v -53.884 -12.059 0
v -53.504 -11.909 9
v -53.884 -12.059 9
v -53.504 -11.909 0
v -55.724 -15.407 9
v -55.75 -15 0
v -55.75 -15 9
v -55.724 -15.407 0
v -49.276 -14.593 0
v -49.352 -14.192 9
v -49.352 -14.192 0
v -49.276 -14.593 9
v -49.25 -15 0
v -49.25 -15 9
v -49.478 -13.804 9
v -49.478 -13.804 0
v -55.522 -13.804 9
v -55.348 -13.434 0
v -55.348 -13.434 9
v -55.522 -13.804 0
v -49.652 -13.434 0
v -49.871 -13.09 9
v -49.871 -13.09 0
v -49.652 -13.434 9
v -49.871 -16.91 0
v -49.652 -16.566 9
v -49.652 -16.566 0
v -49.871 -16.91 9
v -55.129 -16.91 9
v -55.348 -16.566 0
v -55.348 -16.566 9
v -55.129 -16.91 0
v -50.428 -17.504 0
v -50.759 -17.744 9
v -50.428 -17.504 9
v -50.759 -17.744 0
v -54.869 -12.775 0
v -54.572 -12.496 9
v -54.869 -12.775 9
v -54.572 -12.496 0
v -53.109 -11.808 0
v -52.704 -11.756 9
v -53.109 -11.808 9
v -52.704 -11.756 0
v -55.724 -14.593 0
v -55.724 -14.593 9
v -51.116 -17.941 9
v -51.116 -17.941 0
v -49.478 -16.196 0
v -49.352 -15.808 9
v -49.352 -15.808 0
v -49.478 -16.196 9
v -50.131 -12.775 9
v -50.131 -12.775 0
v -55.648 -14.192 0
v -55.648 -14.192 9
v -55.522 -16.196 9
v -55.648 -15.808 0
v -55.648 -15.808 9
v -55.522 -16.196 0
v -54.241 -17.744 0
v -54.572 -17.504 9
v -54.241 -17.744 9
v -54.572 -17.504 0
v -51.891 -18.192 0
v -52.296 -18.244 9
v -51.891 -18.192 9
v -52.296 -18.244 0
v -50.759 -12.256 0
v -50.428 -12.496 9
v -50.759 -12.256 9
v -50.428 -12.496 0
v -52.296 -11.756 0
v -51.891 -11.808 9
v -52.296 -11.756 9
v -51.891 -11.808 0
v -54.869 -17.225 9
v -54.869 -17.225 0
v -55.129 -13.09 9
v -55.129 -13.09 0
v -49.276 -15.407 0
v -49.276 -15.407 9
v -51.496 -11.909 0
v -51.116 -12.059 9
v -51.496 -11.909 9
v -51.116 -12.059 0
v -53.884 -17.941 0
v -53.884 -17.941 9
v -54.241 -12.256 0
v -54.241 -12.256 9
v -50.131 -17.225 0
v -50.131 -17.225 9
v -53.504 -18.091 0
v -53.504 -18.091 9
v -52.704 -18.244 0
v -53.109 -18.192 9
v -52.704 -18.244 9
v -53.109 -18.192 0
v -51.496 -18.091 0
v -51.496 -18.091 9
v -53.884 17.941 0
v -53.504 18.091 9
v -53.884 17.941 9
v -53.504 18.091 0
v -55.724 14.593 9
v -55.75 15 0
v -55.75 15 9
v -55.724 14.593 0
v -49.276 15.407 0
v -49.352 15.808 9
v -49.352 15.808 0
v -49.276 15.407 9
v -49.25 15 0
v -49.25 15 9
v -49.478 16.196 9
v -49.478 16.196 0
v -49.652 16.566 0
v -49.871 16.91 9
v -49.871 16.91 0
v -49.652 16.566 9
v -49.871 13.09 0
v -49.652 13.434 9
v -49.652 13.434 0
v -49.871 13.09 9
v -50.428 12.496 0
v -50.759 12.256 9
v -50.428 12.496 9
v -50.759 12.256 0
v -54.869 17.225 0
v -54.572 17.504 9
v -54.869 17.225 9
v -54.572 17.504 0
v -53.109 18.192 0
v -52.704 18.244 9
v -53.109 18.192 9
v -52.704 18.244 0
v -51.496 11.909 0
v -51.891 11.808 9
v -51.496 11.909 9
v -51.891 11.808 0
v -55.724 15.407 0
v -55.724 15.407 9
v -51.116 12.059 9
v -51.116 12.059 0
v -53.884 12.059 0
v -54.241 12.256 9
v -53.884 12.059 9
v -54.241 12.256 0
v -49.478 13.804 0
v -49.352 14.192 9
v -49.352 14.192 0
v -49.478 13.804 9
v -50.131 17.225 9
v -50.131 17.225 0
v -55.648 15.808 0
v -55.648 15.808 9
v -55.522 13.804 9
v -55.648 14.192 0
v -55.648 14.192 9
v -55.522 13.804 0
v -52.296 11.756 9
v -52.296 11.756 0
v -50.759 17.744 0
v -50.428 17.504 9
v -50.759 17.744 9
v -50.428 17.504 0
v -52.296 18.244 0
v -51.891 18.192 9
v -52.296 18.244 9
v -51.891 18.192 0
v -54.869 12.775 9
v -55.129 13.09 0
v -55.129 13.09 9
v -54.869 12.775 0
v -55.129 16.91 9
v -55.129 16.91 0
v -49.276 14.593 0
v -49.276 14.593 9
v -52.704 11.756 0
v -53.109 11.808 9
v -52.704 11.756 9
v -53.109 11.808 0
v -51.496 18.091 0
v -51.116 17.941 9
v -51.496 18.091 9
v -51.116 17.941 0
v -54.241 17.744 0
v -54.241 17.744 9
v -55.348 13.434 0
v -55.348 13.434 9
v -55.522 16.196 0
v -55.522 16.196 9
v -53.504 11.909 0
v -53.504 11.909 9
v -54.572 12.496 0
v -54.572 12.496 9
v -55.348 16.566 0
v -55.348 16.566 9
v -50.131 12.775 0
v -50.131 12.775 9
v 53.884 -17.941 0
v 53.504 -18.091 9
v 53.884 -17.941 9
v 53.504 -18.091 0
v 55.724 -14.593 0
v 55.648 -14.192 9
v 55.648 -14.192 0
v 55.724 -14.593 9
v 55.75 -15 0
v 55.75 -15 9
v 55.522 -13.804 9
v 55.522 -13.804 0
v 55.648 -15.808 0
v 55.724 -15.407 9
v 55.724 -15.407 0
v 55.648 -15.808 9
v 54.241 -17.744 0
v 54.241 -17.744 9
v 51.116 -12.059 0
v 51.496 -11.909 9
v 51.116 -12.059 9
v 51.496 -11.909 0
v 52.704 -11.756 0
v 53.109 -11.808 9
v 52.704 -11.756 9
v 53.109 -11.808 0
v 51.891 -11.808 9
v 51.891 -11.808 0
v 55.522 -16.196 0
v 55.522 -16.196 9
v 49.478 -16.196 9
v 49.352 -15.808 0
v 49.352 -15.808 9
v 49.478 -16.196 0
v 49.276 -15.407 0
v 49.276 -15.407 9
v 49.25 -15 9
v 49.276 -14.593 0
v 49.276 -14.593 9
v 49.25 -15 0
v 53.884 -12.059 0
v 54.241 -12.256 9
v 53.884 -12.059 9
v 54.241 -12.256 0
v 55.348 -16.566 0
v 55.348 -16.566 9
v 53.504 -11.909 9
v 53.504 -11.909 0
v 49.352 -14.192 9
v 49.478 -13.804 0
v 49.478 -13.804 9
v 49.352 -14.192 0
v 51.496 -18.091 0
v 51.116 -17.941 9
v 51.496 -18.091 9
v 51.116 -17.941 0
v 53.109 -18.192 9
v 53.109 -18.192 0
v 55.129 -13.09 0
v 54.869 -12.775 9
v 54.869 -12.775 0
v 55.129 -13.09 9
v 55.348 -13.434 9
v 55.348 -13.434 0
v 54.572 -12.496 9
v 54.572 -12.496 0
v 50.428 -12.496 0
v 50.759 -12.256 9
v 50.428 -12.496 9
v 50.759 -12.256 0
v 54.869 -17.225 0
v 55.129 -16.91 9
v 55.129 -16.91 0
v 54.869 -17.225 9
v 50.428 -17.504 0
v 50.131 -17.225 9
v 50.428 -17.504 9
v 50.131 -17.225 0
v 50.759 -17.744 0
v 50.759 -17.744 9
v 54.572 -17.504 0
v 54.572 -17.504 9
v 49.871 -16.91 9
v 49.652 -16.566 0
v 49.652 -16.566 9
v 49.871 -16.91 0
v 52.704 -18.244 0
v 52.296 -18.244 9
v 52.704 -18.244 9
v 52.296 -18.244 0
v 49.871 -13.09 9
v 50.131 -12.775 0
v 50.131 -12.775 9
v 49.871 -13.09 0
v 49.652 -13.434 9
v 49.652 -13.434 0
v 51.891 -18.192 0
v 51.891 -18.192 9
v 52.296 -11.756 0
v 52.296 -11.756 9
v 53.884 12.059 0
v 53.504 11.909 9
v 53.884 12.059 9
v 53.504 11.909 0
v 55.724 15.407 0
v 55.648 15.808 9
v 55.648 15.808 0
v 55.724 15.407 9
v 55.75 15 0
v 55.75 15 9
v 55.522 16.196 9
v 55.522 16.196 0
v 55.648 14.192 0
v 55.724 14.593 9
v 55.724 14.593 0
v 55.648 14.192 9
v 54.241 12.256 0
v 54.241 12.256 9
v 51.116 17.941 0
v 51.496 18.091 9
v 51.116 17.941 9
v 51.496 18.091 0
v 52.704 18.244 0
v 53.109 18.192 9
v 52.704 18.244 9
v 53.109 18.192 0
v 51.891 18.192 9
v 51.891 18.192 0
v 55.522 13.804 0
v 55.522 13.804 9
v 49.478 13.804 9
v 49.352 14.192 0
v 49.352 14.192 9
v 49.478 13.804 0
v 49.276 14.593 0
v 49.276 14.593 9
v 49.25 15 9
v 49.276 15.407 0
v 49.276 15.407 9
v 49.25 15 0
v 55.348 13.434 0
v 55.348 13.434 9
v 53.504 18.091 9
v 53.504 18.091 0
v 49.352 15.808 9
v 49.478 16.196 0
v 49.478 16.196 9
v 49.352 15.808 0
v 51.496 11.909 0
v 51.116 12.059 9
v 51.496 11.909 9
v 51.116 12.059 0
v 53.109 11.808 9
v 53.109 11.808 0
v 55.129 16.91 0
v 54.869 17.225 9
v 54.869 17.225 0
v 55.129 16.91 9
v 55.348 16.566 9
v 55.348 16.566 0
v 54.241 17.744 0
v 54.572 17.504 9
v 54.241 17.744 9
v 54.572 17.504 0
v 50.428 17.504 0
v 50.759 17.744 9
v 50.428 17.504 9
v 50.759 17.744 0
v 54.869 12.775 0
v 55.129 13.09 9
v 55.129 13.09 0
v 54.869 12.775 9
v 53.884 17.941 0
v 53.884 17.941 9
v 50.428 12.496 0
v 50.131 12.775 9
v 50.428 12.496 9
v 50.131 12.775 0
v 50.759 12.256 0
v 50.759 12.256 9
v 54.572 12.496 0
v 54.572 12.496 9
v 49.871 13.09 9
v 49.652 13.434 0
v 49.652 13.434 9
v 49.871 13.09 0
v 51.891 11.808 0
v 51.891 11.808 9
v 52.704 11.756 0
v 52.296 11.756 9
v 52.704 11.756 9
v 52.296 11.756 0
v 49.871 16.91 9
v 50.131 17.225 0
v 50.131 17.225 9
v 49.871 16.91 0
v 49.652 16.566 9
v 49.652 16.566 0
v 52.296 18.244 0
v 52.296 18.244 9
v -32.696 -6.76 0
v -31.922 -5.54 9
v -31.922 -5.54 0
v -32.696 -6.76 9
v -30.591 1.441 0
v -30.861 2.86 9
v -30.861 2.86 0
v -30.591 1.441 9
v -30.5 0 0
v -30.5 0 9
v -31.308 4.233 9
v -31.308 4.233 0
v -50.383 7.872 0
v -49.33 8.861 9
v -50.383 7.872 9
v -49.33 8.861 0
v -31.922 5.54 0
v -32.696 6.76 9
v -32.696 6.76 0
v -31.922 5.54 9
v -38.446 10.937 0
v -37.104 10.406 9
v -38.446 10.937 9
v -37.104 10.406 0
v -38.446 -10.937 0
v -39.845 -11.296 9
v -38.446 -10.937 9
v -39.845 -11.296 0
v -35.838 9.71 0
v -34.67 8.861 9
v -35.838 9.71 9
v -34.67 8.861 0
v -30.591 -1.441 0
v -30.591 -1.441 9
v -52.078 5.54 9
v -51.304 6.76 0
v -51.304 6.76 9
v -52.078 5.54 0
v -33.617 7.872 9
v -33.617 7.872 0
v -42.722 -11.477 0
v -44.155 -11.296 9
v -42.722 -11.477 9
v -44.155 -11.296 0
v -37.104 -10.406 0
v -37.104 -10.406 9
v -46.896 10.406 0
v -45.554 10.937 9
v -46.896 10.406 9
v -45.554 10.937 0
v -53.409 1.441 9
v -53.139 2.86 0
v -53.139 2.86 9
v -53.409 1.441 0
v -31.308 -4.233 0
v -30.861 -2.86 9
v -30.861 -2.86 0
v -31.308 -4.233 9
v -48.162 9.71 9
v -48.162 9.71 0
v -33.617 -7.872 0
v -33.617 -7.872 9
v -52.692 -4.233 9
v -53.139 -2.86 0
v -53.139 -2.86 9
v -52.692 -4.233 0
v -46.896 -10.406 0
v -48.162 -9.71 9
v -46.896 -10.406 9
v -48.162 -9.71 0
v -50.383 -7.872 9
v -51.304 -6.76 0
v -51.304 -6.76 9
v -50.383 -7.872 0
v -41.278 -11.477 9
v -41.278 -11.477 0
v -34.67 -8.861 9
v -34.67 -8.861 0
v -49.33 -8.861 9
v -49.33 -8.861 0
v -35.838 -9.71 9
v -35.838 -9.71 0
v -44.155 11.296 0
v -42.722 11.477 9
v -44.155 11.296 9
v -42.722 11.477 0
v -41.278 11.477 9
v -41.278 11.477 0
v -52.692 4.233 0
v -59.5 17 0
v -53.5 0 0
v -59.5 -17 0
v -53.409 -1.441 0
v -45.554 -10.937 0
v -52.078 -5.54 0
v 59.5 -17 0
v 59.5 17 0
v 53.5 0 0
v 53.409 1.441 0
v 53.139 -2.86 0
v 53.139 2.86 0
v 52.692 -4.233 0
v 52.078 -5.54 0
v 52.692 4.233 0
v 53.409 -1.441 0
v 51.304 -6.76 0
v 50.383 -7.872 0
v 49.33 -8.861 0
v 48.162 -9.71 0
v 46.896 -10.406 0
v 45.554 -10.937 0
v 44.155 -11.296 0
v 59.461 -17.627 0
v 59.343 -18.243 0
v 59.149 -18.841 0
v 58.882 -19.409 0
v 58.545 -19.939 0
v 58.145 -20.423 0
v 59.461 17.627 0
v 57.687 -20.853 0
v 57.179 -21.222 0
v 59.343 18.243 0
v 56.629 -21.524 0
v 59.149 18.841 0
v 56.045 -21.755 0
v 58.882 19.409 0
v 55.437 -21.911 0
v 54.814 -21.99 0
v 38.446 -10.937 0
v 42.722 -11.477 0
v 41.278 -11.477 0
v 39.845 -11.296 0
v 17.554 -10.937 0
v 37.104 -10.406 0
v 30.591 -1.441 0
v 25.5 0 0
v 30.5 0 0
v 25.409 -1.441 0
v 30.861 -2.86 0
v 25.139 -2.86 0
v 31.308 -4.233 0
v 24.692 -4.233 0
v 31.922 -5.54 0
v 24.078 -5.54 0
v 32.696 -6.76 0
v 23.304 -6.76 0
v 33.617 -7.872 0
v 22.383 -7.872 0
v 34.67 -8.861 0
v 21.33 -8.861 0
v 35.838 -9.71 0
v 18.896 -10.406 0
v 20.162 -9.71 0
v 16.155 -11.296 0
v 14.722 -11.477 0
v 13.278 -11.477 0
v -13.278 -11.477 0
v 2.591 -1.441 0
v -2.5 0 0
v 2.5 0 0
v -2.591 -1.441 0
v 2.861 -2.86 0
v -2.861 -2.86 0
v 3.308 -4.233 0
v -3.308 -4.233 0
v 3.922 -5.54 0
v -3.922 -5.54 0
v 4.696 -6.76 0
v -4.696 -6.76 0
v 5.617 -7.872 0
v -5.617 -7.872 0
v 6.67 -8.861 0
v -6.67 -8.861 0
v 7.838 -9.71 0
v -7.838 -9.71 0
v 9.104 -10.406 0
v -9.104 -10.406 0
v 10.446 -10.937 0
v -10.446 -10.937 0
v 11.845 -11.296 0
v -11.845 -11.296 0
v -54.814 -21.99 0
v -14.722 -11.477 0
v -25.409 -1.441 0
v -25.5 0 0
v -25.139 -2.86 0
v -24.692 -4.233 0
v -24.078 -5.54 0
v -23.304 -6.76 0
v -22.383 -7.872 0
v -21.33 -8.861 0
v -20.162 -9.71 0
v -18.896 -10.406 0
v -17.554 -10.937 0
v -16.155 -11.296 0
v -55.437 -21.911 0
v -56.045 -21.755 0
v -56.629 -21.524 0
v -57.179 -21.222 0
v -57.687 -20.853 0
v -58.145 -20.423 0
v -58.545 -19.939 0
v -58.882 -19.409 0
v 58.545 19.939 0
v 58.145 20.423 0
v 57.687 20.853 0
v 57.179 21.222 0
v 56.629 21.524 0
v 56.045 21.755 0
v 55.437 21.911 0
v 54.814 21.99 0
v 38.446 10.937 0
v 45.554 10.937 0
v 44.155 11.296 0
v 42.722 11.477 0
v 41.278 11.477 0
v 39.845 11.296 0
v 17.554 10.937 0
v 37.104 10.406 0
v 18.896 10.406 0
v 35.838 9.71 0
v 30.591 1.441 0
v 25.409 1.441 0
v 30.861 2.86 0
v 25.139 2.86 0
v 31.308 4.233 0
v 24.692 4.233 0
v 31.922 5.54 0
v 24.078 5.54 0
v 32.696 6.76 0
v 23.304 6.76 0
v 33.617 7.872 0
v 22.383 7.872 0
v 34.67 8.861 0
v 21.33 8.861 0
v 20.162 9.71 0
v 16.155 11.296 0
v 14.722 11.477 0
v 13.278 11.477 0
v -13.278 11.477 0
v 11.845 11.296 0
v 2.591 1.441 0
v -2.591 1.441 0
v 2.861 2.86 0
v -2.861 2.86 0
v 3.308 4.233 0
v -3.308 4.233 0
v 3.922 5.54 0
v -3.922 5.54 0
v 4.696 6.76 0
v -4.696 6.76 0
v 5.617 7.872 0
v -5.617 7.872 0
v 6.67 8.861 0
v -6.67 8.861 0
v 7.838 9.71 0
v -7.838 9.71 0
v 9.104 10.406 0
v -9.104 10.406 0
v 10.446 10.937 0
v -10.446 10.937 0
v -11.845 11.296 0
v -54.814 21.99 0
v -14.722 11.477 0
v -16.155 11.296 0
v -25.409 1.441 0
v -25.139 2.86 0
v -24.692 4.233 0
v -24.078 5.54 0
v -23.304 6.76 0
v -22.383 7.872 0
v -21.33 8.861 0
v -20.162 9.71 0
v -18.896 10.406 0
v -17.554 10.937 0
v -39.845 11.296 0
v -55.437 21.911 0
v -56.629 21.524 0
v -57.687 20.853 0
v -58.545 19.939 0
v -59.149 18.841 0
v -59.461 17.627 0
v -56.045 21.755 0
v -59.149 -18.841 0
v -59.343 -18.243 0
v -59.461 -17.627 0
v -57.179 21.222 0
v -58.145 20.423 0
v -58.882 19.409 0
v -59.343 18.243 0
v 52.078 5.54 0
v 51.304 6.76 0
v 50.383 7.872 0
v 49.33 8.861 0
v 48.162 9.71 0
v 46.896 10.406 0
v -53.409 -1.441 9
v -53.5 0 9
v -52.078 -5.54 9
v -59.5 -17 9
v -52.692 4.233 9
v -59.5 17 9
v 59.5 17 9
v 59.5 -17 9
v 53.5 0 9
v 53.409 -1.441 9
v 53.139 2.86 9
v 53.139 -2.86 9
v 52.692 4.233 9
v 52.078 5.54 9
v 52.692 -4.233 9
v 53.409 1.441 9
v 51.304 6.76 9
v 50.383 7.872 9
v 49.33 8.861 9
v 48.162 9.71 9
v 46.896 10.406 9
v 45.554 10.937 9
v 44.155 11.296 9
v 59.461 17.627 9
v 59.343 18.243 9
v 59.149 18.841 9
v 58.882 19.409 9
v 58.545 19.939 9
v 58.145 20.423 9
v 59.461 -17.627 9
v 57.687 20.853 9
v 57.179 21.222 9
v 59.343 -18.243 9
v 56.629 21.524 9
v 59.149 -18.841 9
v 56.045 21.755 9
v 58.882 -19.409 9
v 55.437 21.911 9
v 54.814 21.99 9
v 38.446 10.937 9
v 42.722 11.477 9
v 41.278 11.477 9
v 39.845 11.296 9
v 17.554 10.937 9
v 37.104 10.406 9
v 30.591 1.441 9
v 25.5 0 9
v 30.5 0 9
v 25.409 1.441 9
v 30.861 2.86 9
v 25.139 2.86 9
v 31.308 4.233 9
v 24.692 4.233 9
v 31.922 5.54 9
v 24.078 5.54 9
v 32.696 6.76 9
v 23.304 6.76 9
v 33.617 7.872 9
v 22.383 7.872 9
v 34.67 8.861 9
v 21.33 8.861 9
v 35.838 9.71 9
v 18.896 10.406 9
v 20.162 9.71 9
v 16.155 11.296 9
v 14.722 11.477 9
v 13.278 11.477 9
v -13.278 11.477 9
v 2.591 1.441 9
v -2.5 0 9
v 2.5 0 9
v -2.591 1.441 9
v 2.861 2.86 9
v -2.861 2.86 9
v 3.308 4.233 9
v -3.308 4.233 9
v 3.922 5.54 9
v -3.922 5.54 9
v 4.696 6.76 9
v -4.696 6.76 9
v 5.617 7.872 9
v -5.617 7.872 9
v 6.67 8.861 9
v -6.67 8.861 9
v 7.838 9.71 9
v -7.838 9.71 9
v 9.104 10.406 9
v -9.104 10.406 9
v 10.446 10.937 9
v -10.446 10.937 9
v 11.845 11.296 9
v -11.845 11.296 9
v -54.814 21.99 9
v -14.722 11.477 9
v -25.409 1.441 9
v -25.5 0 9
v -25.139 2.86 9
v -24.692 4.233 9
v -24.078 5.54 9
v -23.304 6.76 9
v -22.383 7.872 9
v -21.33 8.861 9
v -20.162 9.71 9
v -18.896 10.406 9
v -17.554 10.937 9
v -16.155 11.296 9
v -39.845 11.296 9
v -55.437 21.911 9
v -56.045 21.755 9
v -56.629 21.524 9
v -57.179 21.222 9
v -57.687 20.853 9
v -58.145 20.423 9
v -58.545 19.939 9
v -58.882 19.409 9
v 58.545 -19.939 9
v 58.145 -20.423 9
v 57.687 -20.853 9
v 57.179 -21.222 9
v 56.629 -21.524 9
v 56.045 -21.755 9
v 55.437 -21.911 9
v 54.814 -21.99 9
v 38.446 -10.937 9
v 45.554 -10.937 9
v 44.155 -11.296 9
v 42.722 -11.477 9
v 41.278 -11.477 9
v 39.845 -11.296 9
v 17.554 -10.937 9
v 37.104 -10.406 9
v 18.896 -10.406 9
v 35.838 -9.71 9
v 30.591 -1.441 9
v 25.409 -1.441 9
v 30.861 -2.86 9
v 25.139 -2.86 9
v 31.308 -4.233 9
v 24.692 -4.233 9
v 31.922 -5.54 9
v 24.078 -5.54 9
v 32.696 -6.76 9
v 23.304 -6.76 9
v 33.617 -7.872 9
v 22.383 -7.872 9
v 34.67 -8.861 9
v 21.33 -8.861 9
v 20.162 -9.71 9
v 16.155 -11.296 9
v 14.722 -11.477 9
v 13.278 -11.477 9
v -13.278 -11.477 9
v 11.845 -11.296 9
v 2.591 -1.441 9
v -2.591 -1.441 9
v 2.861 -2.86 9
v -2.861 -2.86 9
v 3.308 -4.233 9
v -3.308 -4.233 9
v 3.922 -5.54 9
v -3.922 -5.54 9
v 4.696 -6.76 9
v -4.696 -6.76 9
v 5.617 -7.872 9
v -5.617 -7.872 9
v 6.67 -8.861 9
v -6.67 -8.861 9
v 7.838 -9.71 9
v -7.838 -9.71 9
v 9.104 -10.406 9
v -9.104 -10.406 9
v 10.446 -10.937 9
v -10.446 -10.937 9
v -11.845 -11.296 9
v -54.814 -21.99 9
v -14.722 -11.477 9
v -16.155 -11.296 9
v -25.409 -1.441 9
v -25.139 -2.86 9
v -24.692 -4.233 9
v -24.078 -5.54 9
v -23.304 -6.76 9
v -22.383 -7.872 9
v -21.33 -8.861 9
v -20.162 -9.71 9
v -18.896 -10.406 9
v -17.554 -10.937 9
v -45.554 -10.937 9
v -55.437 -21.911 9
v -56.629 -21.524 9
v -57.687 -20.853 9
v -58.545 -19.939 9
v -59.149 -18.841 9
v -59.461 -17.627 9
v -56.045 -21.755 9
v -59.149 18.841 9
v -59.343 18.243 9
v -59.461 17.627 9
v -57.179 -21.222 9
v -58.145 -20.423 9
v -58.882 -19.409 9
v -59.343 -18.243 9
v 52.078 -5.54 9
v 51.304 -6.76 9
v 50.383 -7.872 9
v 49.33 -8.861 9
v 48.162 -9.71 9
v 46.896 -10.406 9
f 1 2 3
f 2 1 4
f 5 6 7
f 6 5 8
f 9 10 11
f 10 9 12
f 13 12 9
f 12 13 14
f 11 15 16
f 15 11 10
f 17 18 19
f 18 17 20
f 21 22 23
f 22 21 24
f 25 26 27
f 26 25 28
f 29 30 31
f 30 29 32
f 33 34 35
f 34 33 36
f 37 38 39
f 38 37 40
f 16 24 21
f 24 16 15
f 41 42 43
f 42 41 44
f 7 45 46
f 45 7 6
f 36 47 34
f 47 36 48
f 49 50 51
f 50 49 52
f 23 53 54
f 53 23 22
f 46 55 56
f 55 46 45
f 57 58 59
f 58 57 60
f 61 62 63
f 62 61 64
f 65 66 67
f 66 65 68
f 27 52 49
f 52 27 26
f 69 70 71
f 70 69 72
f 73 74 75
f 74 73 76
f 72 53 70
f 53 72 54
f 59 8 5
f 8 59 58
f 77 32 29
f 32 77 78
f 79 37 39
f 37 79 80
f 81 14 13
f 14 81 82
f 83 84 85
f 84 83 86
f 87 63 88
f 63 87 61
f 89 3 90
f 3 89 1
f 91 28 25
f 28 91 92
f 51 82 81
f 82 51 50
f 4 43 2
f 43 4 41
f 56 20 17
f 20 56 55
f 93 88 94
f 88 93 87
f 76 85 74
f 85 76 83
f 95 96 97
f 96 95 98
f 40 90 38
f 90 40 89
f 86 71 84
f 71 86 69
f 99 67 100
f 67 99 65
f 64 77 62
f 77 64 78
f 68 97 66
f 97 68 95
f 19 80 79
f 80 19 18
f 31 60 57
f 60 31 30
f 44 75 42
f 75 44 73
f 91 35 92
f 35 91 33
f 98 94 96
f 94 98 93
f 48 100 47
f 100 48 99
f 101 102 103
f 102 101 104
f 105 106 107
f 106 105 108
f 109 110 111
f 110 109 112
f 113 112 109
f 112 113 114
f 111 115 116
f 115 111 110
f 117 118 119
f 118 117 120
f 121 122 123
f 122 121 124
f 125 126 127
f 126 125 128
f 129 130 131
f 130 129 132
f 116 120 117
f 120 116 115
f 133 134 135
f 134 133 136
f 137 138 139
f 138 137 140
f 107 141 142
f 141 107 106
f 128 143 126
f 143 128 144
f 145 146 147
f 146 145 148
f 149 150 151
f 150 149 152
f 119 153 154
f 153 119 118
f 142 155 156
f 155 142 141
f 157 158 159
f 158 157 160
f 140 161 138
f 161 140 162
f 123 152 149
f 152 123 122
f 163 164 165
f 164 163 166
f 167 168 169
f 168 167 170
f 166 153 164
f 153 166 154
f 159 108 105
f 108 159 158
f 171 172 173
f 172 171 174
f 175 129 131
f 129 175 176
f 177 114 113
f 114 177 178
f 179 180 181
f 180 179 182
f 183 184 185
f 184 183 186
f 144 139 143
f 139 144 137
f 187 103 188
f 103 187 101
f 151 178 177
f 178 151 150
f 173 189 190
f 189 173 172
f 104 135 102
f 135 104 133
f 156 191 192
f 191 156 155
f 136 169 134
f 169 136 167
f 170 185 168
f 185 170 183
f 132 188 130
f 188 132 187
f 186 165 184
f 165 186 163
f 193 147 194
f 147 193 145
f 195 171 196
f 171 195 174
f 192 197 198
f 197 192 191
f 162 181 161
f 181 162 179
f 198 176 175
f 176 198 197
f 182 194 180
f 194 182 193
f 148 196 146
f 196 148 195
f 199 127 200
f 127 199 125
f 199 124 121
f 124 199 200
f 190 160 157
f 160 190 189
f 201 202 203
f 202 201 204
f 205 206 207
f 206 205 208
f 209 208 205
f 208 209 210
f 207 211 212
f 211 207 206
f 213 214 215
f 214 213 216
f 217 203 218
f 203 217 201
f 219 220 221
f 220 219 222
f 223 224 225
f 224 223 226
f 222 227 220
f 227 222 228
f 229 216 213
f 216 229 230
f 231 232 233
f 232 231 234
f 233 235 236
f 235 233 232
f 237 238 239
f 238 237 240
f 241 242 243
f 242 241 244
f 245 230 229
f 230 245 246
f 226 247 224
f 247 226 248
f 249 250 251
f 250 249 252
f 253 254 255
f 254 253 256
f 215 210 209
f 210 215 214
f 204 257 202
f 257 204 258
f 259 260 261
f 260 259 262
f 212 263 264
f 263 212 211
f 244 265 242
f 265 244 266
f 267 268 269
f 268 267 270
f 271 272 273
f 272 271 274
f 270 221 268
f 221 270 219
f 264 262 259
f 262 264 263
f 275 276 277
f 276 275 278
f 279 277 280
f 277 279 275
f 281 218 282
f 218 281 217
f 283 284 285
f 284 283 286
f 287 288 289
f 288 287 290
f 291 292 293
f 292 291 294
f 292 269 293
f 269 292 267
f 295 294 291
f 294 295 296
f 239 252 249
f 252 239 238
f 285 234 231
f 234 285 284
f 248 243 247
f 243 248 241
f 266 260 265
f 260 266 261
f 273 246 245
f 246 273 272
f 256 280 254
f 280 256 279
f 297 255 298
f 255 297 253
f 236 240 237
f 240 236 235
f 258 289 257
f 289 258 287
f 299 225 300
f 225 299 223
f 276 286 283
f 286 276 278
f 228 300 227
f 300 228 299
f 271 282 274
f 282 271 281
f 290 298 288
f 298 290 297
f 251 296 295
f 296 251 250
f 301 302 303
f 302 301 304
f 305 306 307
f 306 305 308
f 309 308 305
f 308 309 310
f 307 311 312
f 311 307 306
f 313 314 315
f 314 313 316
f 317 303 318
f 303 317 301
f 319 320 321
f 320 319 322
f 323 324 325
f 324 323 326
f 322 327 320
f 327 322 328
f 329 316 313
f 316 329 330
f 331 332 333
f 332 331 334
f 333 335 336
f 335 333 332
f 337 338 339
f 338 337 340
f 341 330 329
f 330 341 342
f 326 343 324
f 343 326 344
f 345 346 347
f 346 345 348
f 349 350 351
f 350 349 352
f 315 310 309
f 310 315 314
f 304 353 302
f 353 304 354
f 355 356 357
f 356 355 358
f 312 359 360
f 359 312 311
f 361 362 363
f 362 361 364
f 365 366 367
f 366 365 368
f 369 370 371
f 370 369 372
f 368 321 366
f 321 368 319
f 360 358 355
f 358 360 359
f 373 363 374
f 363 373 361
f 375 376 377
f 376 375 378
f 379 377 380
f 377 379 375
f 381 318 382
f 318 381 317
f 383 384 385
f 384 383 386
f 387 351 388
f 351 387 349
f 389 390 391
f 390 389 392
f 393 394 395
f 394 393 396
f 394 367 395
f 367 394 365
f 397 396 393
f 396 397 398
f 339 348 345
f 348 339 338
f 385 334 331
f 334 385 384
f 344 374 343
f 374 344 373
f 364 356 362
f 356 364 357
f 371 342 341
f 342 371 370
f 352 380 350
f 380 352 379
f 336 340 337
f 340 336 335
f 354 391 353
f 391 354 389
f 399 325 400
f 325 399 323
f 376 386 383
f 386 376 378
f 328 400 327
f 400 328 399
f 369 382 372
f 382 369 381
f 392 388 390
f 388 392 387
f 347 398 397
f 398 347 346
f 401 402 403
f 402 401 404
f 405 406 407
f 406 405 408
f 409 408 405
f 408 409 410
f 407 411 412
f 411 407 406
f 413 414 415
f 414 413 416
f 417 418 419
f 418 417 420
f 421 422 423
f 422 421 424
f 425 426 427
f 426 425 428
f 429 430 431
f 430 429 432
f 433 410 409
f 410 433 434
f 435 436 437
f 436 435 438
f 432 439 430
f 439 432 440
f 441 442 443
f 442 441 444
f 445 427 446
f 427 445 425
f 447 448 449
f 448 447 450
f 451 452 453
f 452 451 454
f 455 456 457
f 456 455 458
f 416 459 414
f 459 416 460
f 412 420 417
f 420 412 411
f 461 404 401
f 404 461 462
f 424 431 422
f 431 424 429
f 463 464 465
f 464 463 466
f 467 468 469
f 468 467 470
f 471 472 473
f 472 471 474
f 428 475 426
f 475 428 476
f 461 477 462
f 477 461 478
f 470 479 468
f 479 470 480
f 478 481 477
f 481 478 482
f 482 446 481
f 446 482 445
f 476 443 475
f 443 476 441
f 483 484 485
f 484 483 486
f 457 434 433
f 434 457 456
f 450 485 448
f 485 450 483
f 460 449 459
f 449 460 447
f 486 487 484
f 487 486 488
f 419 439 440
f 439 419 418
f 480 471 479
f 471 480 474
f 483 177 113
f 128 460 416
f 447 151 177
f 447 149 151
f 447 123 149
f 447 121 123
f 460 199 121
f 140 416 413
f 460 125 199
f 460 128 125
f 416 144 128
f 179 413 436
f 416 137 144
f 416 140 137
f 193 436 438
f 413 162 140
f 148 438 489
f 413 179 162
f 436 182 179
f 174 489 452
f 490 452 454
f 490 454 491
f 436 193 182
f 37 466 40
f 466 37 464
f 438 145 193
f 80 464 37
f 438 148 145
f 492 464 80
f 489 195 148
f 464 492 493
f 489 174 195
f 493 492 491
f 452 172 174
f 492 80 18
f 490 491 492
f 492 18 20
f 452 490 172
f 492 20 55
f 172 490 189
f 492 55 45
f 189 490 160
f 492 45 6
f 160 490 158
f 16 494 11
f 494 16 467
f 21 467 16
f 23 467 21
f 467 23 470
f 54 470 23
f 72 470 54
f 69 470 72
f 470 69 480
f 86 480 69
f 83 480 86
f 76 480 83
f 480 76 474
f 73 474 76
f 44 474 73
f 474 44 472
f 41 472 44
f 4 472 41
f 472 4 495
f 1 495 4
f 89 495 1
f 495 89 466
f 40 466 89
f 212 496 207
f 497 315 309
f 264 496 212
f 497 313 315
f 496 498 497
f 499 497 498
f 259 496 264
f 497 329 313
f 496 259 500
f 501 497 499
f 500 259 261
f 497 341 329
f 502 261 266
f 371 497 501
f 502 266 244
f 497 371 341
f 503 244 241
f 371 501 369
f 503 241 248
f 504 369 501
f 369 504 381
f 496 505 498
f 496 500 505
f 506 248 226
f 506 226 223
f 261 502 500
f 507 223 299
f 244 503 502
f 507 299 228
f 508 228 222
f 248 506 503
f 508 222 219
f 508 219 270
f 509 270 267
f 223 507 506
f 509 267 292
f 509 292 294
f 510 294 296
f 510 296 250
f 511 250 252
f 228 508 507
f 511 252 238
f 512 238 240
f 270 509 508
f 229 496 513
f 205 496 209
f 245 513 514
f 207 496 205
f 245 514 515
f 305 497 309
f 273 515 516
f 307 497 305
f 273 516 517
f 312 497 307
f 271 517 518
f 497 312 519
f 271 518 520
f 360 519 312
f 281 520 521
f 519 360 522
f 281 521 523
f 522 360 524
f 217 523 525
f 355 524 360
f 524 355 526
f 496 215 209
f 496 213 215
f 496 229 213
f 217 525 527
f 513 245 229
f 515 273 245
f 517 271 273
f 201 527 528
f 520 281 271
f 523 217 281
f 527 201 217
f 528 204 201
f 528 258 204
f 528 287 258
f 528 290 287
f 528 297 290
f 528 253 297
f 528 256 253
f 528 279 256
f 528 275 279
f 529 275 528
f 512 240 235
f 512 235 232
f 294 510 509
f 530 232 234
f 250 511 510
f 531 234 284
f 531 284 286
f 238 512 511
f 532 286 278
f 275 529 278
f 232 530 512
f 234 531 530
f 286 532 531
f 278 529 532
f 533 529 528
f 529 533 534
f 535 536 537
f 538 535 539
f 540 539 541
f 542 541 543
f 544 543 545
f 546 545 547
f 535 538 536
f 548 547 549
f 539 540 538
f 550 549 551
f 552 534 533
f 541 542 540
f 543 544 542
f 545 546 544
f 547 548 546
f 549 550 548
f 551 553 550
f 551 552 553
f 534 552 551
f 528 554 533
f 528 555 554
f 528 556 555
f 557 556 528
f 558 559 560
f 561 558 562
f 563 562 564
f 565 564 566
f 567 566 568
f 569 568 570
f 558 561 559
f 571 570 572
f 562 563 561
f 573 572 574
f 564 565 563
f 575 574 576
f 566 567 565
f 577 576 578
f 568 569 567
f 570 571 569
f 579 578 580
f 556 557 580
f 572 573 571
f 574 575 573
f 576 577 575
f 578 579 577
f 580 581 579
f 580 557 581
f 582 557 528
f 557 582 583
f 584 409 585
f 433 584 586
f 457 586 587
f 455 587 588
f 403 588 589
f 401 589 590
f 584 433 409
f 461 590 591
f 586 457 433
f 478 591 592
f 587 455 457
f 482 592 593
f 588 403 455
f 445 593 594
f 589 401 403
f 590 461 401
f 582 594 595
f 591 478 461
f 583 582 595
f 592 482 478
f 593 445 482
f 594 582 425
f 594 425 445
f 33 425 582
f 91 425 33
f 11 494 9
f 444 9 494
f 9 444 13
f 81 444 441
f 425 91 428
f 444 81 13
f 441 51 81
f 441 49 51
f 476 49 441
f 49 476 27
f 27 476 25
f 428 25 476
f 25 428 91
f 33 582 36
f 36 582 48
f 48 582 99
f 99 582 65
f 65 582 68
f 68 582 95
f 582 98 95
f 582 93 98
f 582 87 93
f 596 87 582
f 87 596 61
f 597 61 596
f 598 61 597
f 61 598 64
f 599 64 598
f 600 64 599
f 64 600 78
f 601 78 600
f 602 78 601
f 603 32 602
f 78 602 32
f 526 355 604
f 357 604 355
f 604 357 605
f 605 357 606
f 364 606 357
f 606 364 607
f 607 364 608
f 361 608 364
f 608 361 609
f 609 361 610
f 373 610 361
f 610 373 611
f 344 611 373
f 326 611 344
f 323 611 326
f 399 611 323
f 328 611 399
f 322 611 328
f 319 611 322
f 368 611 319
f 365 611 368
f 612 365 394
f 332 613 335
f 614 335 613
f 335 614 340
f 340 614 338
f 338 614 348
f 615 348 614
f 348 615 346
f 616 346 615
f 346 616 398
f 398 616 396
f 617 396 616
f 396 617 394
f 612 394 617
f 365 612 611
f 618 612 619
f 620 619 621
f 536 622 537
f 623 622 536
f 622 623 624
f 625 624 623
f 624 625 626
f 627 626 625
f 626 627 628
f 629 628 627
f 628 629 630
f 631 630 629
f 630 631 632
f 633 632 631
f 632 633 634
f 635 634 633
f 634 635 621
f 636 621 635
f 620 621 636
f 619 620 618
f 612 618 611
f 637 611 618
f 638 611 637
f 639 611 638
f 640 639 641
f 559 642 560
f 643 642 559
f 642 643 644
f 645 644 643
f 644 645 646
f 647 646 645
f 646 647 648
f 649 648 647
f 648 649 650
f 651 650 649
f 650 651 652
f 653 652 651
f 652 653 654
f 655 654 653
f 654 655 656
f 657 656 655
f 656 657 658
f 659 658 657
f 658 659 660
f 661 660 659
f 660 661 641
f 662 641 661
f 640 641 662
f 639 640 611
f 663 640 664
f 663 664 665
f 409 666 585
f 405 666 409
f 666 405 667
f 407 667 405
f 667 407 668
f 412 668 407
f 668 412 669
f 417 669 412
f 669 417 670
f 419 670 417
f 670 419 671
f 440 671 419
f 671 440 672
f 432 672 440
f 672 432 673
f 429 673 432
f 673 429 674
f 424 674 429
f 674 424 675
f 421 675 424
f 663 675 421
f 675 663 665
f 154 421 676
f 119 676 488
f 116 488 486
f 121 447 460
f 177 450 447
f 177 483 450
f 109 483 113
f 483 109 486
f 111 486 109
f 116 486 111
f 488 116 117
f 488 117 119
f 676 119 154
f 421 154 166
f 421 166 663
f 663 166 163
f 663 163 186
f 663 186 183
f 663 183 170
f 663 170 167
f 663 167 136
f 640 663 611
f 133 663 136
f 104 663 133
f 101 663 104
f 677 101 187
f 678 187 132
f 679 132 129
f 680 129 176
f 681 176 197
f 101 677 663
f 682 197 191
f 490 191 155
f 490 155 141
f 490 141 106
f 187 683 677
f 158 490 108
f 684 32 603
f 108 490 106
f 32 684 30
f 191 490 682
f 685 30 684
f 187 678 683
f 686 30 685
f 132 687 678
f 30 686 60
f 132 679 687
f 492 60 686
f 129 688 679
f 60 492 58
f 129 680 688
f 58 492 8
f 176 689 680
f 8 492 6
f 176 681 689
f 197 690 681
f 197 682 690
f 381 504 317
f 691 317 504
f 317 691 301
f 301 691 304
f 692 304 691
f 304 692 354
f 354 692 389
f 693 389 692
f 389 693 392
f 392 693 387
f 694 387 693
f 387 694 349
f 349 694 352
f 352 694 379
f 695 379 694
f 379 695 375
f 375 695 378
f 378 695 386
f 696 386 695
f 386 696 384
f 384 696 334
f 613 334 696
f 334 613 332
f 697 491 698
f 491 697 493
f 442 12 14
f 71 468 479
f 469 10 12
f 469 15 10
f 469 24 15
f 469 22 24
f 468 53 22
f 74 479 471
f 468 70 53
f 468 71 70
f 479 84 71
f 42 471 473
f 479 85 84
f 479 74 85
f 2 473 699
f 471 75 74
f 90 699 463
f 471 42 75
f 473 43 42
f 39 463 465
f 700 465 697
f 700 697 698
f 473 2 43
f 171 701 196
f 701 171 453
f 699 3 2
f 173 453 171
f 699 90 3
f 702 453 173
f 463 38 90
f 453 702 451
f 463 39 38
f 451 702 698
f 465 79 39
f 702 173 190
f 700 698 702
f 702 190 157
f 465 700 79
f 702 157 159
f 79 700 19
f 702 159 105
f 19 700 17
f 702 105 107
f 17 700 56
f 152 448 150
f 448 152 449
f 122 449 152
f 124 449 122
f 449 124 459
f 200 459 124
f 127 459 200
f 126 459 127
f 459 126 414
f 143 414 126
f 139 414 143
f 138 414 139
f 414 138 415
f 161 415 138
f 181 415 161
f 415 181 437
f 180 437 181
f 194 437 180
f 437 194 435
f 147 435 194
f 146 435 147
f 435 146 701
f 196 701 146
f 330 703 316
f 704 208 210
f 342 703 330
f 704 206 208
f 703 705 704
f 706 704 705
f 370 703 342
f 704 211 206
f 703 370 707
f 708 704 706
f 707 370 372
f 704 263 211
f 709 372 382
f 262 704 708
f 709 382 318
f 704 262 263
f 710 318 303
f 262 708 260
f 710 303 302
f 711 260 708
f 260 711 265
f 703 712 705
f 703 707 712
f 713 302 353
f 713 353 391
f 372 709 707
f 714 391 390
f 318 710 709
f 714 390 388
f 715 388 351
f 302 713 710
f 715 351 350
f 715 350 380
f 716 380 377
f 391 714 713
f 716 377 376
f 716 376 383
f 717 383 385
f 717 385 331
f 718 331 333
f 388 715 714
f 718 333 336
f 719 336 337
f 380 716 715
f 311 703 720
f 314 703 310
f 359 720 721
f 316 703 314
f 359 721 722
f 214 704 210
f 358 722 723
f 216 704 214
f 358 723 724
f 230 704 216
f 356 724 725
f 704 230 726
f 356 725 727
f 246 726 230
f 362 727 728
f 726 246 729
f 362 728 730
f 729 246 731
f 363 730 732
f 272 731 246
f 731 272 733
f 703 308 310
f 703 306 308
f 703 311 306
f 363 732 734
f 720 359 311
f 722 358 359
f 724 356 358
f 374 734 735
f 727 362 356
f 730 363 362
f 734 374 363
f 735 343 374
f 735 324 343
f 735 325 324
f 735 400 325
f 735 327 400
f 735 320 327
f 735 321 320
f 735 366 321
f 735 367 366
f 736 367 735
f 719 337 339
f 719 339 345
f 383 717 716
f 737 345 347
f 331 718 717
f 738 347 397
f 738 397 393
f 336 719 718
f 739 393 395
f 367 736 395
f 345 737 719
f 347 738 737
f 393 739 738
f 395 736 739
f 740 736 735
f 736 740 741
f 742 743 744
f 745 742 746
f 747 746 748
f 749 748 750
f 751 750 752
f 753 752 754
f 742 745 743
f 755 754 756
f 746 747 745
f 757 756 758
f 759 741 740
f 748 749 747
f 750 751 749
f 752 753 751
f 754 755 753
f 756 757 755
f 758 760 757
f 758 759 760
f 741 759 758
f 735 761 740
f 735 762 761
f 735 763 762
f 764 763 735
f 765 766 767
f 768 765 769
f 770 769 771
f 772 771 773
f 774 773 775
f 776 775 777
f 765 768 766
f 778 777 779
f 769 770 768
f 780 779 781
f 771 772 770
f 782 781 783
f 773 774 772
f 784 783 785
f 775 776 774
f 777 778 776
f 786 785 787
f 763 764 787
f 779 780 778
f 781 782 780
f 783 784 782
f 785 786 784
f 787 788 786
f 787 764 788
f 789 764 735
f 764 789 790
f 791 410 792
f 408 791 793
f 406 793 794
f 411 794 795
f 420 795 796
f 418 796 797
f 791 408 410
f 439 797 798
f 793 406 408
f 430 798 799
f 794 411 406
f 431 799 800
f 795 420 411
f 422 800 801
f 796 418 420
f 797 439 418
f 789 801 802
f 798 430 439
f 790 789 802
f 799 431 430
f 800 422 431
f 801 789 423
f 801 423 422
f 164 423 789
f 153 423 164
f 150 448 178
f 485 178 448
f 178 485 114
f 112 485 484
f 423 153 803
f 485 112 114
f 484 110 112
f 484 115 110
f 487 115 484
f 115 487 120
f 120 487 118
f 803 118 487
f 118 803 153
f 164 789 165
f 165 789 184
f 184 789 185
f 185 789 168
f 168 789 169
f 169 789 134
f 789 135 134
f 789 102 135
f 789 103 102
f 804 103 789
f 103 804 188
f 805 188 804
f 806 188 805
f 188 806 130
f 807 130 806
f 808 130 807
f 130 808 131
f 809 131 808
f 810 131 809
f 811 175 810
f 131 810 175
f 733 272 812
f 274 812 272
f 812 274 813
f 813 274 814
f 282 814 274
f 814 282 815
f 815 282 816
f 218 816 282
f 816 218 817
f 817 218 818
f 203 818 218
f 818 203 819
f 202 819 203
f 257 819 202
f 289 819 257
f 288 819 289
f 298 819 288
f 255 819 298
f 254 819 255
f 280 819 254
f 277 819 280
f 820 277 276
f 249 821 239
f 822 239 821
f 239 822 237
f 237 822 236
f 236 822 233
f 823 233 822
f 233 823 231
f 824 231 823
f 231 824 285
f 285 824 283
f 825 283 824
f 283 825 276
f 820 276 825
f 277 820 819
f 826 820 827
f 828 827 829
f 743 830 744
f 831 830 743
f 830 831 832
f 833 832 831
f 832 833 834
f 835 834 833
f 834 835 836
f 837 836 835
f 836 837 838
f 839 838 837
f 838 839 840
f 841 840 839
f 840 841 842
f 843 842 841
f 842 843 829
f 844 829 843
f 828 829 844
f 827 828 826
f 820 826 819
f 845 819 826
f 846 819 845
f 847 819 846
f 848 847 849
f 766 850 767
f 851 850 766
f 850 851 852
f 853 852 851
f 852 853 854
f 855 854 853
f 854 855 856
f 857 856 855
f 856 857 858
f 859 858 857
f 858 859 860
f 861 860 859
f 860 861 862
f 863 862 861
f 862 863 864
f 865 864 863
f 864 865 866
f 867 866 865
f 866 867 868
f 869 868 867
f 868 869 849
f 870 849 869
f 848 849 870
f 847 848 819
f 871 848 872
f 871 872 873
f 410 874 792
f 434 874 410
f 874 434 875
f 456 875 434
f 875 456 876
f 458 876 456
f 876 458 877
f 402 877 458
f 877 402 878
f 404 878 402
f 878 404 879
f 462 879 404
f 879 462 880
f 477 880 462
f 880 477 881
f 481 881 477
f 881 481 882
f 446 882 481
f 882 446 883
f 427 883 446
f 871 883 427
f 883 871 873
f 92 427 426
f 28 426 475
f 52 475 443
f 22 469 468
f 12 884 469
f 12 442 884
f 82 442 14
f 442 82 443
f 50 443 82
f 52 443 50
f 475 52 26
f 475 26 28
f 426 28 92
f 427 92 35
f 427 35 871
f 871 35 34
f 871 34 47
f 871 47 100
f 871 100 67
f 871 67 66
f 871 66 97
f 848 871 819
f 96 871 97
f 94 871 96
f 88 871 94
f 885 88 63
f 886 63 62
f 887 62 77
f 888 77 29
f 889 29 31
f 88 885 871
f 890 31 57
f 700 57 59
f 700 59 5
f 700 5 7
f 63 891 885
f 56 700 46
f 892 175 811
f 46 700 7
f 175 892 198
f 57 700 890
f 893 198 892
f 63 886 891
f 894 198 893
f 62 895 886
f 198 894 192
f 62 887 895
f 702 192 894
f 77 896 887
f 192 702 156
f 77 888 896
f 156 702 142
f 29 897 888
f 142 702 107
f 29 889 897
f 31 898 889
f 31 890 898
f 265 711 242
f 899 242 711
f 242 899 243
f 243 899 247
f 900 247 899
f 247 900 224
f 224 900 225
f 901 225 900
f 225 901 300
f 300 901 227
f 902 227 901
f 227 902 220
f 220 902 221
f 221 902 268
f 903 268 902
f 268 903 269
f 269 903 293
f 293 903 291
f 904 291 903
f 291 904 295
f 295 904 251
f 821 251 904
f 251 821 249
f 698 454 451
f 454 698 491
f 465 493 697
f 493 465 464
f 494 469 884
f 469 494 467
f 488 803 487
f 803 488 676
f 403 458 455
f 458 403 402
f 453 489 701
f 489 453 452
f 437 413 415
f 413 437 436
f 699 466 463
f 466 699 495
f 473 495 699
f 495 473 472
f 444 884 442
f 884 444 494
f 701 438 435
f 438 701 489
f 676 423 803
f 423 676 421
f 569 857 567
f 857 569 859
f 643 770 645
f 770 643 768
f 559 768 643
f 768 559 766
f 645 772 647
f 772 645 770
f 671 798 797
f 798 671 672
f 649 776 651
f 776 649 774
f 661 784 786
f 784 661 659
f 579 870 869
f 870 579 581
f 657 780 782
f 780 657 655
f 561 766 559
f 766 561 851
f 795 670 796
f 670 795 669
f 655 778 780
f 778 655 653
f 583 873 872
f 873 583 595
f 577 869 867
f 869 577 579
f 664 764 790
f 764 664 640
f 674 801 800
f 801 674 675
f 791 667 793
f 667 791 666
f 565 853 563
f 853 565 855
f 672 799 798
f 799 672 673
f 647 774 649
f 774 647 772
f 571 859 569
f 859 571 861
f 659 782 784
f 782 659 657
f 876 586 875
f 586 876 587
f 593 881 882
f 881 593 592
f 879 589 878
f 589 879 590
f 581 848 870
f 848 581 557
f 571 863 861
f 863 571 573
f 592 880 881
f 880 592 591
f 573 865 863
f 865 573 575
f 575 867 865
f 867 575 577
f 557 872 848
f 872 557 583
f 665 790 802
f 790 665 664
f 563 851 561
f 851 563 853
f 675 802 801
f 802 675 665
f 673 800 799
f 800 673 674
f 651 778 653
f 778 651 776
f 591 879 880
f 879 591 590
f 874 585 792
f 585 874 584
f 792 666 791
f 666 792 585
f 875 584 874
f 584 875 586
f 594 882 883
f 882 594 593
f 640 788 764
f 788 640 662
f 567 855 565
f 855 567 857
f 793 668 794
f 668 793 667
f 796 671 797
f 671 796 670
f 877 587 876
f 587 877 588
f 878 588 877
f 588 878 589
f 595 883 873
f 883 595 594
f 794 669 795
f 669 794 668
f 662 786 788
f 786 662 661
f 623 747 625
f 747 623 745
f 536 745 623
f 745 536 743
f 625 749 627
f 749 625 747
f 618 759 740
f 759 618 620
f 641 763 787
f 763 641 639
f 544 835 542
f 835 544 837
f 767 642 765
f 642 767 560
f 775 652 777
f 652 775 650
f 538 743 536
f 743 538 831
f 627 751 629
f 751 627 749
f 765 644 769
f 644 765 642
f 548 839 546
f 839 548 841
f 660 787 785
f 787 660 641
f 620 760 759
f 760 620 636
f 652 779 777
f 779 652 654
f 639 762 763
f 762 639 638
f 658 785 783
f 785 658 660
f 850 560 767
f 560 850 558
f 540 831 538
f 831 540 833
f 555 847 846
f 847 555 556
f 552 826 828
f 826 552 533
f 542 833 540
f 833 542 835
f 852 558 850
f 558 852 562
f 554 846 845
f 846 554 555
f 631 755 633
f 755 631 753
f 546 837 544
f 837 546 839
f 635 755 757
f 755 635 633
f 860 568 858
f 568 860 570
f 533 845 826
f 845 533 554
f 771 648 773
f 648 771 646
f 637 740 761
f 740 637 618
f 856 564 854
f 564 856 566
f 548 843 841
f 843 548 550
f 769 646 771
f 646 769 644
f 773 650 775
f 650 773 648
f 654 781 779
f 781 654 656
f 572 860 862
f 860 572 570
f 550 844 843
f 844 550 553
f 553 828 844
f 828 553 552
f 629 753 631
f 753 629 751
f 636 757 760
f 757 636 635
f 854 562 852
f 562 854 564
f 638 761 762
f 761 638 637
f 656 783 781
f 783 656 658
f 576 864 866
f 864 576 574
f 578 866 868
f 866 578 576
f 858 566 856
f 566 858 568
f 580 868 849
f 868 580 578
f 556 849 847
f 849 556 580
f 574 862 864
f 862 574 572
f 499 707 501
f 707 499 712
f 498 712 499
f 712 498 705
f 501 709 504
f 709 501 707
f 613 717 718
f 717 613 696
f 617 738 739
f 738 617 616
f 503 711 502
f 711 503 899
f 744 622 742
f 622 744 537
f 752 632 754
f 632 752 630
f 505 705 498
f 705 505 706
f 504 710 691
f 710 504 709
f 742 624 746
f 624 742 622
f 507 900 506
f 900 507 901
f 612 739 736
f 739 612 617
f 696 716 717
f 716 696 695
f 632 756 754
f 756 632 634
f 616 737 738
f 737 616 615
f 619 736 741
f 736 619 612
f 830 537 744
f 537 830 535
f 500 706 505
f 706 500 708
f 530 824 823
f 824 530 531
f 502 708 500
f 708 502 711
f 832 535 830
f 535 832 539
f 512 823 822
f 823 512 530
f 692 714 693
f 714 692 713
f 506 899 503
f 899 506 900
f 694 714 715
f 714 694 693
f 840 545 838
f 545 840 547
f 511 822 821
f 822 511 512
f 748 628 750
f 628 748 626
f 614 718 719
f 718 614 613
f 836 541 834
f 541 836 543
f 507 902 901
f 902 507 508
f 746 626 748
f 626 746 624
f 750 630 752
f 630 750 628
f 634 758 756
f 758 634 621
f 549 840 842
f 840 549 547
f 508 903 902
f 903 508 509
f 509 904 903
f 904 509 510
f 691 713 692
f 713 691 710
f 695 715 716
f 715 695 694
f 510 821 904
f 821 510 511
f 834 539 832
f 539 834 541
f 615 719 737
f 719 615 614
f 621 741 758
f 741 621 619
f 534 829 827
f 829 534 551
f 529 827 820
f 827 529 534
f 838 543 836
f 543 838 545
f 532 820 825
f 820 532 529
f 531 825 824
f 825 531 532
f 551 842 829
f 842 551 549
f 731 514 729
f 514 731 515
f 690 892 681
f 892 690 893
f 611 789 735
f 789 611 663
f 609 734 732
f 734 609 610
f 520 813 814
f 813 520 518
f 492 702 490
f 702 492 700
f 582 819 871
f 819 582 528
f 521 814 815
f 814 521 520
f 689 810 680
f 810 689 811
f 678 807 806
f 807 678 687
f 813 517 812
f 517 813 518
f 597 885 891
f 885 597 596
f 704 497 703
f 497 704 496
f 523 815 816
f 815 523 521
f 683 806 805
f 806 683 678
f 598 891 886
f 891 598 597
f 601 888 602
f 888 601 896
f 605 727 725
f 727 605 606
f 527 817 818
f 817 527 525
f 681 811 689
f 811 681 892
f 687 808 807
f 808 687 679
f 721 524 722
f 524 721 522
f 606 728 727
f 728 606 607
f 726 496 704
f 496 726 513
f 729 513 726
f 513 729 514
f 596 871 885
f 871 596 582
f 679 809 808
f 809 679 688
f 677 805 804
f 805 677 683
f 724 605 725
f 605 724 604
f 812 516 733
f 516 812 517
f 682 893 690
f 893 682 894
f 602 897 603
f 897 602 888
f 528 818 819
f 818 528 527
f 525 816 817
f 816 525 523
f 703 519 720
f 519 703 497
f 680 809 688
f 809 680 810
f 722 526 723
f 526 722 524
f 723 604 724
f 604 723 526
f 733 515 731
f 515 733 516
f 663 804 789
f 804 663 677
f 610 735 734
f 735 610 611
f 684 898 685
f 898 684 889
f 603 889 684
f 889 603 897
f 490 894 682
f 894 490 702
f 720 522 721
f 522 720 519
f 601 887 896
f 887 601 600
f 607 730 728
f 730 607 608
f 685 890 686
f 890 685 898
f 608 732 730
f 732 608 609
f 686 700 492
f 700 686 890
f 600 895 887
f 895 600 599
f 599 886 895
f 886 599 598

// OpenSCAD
$fn = 50;


difference() {
	union() {
		hull() {
			translate(v = [-54.5000000000, 17.0000000000, 0]) {
				cylinder(h = 9, r = 5);
			}
			translate(v = [54.5000000000, 17.0000000000, 0]) {
				cylinder(h = 9, r = 5);
			}
			translate(v = [-54.5000000000, -17.0000000000, 0]) {
				cylinder(h = 9, r = 5);
			}
			translate(v = [54.5000000000, -17.0000000000, 0]) {
				cylinder(h = 9, r = 5);
			}
		}
	}
	union() {
		#translate(v = [-52.5000000000, -15.0000000000, -100.0000000000]) {
			cylinder(h = 200, r = 3.2500000000);
		}
		#translate(v = [-52.5000000000, 15.0000000000, -100.0000000000]) {
			cylinder(h = 200, r = 3.2500000000);
		}
		#translate(v = [52.5000000000, -15.0000000000, -100.0000000000]) {
			cylinder(h = 200, r = 3.2500000000);
		}
		#translate(v = [52.5000000000, 15.0000000000, -100.0000000000]) {
			cylinder(h = 200, r = 3.2500000000);
		}
		#translate(v = [-42.0000000000, 0, 0]) {
			cylinder(h = 9, r = 11.5000000000);
		}
		#translate(v = [-14.0000000000, 0, 0]) {
			cylinder(h = 9, r = 11.5000000000);
		}
		#translate(v = [14.0000000000, 0, 0]) {
			cylinder(h = 9, r = 11.5000000000);
		}
		#translate(v = [42.0000000000, 0, 0]) {
			cylinder(h = 9, r = 11.5000000000);
		}
	}
}
